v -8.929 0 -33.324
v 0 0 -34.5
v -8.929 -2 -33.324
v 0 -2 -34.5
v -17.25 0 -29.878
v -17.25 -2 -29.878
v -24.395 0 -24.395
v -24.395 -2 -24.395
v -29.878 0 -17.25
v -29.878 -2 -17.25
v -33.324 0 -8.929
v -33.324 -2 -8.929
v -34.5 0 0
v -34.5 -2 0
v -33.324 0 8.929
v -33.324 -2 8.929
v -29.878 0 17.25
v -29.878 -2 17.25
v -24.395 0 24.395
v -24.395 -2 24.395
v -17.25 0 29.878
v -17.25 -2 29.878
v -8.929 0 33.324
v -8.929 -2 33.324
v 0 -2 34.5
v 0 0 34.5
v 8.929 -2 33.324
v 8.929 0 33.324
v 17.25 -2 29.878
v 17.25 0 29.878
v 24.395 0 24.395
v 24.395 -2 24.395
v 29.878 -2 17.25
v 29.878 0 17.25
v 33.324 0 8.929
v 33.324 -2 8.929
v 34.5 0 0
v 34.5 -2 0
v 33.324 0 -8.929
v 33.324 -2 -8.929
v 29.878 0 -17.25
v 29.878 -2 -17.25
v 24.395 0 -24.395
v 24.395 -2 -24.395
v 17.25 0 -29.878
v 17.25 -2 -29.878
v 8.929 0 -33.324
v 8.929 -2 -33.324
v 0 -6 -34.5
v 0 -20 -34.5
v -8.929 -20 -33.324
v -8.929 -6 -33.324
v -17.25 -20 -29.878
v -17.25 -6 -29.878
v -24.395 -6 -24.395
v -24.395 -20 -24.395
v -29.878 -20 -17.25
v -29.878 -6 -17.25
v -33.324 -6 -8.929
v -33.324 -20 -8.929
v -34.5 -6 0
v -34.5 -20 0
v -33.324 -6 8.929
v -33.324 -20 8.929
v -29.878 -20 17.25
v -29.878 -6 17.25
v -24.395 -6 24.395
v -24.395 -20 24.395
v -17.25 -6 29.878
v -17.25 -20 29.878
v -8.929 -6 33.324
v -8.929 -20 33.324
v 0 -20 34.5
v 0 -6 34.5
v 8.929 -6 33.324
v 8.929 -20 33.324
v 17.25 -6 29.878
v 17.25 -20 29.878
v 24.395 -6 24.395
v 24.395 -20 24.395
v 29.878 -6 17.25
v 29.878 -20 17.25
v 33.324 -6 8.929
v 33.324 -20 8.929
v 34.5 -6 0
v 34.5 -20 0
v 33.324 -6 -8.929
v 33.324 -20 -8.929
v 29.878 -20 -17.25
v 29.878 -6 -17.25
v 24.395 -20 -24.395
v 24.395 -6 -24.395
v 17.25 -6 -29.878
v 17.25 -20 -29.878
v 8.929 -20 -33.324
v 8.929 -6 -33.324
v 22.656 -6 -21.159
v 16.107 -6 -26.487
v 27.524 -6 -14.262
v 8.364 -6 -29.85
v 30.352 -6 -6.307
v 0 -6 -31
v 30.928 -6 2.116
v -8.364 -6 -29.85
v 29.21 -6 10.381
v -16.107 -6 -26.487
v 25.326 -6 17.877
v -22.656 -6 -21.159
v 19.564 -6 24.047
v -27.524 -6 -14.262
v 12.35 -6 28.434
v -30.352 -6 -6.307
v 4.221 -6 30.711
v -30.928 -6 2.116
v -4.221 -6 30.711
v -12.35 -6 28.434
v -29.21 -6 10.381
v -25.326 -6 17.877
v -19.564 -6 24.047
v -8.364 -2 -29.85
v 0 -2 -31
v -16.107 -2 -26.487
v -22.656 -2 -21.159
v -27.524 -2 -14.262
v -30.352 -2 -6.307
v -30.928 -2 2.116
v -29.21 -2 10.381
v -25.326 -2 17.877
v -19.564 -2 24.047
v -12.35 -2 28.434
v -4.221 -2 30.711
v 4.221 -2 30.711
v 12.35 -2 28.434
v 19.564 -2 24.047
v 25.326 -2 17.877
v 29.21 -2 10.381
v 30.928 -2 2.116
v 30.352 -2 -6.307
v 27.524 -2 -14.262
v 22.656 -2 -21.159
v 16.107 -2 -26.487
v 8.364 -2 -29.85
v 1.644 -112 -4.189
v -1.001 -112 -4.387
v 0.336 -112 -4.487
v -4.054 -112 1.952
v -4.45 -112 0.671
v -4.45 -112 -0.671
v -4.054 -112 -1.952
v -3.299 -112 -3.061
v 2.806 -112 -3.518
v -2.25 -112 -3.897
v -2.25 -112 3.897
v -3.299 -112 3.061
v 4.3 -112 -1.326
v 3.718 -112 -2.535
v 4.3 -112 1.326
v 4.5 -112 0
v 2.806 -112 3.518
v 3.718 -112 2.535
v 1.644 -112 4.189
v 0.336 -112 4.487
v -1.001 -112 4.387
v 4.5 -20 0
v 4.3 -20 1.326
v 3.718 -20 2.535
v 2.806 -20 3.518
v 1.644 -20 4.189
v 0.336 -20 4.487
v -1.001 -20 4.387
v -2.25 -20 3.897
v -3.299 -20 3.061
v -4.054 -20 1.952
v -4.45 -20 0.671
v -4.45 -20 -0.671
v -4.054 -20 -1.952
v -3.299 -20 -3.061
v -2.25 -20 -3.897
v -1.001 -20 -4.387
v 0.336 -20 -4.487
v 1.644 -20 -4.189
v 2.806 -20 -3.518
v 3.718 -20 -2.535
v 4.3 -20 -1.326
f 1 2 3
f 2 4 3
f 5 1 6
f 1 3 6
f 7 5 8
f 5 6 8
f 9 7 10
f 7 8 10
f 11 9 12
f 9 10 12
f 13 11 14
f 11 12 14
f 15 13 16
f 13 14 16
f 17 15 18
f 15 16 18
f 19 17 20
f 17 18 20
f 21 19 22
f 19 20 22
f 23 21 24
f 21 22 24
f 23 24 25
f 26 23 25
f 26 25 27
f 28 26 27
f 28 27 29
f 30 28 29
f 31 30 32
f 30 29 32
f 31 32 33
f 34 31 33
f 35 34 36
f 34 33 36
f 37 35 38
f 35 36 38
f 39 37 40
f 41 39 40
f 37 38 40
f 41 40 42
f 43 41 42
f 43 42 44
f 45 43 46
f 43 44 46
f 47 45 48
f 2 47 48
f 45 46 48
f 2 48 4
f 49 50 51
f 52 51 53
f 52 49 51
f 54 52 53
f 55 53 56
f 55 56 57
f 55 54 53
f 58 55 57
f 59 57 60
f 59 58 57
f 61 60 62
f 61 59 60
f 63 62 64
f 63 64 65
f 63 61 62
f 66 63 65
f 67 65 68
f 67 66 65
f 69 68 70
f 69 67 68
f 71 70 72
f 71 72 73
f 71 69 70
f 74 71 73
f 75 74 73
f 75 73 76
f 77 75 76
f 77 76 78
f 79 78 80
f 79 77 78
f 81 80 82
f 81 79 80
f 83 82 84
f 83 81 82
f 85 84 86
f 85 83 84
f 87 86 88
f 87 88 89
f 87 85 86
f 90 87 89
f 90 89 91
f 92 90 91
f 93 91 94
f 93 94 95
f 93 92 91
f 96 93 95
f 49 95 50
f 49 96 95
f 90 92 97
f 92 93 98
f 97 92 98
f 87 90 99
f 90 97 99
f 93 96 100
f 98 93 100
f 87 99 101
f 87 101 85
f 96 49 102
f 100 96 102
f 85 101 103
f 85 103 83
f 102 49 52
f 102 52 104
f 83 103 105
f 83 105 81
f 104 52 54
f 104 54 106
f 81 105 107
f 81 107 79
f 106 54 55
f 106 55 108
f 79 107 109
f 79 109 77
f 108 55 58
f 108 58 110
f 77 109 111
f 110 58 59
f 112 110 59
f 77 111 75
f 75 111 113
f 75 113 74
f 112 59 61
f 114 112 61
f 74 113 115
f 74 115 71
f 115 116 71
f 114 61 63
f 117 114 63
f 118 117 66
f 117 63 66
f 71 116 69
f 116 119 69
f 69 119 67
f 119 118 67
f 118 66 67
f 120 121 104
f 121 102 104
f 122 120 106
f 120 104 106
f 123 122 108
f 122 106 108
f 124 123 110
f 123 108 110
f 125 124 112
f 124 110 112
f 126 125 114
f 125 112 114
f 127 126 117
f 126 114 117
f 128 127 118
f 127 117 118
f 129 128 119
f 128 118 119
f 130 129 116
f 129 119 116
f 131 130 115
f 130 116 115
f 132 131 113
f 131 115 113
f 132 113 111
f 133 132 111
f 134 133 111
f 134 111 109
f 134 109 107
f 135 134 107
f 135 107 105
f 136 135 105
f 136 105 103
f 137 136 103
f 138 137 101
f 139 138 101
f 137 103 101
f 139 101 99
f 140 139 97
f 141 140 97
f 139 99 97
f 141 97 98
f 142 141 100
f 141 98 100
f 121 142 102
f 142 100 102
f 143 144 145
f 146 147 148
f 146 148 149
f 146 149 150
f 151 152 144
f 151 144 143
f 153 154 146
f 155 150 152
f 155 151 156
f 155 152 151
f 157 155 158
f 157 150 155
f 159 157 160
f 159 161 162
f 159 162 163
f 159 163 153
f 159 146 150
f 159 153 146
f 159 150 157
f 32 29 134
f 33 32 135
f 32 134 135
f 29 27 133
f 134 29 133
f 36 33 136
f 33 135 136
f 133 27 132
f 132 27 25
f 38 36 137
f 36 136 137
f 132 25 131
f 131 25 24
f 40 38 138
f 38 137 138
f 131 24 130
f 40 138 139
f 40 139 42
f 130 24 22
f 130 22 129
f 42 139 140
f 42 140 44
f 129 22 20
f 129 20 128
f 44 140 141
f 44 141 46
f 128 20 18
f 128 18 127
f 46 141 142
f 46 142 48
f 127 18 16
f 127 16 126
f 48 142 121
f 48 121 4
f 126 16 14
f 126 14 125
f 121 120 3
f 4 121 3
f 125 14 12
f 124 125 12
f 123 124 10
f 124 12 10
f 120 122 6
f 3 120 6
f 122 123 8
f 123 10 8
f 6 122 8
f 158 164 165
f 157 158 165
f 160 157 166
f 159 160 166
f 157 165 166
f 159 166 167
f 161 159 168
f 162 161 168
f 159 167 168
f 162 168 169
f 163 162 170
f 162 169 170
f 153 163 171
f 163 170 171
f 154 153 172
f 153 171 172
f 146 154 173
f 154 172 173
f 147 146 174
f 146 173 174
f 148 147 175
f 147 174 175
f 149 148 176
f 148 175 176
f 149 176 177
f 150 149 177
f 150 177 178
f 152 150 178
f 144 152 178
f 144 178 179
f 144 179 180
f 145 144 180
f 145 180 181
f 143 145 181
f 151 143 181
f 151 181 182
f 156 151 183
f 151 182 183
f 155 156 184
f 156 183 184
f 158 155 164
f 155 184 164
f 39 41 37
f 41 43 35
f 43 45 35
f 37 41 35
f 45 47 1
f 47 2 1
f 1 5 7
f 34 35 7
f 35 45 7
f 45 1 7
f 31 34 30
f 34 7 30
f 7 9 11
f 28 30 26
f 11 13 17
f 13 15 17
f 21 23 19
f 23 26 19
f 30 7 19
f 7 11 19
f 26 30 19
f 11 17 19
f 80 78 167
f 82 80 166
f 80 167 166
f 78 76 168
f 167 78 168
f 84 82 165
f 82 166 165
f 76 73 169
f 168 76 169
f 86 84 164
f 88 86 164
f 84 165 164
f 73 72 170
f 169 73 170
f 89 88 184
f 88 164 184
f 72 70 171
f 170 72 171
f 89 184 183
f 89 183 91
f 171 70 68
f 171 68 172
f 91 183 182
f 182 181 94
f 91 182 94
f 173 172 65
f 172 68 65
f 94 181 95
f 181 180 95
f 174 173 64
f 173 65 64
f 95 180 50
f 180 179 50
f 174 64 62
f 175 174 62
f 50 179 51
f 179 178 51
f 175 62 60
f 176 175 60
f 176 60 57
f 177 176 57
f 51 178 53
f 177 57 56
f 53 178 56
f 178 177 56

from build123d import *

# Parameters (mm, degrees)
SKETCH2_R           = 4.5
BOSS_EXTRUDE1_DEPTH = 92


with BuildPart() as part:
    # Sketch1 → Revolve1 (revolve)
    with BuildSketch(Plane(origin=(0, 0, 0), x_dir=(0, 0, -1), z_dir=(1, 0, 0))):
        Polygon((0, 0), (34.5, 0), (34.5, -2), (31, -2), (31, -6), (34.5, -6), (34.5, -14), (34.5, -18), (34.5, -20), (0, -20), align=None)
    revolve(axis=Axis((0, -20, 0), (0, 1, 0)))

    # Sketch2 → Boss-Extrude1 (add)
    with BuildSketch(Plane.XZ.offset(20)):
        Circle(SKETCH2_R)
    extrude(amount=BOSS_EXTRUDE1_DEPTH)


solid = part.part
